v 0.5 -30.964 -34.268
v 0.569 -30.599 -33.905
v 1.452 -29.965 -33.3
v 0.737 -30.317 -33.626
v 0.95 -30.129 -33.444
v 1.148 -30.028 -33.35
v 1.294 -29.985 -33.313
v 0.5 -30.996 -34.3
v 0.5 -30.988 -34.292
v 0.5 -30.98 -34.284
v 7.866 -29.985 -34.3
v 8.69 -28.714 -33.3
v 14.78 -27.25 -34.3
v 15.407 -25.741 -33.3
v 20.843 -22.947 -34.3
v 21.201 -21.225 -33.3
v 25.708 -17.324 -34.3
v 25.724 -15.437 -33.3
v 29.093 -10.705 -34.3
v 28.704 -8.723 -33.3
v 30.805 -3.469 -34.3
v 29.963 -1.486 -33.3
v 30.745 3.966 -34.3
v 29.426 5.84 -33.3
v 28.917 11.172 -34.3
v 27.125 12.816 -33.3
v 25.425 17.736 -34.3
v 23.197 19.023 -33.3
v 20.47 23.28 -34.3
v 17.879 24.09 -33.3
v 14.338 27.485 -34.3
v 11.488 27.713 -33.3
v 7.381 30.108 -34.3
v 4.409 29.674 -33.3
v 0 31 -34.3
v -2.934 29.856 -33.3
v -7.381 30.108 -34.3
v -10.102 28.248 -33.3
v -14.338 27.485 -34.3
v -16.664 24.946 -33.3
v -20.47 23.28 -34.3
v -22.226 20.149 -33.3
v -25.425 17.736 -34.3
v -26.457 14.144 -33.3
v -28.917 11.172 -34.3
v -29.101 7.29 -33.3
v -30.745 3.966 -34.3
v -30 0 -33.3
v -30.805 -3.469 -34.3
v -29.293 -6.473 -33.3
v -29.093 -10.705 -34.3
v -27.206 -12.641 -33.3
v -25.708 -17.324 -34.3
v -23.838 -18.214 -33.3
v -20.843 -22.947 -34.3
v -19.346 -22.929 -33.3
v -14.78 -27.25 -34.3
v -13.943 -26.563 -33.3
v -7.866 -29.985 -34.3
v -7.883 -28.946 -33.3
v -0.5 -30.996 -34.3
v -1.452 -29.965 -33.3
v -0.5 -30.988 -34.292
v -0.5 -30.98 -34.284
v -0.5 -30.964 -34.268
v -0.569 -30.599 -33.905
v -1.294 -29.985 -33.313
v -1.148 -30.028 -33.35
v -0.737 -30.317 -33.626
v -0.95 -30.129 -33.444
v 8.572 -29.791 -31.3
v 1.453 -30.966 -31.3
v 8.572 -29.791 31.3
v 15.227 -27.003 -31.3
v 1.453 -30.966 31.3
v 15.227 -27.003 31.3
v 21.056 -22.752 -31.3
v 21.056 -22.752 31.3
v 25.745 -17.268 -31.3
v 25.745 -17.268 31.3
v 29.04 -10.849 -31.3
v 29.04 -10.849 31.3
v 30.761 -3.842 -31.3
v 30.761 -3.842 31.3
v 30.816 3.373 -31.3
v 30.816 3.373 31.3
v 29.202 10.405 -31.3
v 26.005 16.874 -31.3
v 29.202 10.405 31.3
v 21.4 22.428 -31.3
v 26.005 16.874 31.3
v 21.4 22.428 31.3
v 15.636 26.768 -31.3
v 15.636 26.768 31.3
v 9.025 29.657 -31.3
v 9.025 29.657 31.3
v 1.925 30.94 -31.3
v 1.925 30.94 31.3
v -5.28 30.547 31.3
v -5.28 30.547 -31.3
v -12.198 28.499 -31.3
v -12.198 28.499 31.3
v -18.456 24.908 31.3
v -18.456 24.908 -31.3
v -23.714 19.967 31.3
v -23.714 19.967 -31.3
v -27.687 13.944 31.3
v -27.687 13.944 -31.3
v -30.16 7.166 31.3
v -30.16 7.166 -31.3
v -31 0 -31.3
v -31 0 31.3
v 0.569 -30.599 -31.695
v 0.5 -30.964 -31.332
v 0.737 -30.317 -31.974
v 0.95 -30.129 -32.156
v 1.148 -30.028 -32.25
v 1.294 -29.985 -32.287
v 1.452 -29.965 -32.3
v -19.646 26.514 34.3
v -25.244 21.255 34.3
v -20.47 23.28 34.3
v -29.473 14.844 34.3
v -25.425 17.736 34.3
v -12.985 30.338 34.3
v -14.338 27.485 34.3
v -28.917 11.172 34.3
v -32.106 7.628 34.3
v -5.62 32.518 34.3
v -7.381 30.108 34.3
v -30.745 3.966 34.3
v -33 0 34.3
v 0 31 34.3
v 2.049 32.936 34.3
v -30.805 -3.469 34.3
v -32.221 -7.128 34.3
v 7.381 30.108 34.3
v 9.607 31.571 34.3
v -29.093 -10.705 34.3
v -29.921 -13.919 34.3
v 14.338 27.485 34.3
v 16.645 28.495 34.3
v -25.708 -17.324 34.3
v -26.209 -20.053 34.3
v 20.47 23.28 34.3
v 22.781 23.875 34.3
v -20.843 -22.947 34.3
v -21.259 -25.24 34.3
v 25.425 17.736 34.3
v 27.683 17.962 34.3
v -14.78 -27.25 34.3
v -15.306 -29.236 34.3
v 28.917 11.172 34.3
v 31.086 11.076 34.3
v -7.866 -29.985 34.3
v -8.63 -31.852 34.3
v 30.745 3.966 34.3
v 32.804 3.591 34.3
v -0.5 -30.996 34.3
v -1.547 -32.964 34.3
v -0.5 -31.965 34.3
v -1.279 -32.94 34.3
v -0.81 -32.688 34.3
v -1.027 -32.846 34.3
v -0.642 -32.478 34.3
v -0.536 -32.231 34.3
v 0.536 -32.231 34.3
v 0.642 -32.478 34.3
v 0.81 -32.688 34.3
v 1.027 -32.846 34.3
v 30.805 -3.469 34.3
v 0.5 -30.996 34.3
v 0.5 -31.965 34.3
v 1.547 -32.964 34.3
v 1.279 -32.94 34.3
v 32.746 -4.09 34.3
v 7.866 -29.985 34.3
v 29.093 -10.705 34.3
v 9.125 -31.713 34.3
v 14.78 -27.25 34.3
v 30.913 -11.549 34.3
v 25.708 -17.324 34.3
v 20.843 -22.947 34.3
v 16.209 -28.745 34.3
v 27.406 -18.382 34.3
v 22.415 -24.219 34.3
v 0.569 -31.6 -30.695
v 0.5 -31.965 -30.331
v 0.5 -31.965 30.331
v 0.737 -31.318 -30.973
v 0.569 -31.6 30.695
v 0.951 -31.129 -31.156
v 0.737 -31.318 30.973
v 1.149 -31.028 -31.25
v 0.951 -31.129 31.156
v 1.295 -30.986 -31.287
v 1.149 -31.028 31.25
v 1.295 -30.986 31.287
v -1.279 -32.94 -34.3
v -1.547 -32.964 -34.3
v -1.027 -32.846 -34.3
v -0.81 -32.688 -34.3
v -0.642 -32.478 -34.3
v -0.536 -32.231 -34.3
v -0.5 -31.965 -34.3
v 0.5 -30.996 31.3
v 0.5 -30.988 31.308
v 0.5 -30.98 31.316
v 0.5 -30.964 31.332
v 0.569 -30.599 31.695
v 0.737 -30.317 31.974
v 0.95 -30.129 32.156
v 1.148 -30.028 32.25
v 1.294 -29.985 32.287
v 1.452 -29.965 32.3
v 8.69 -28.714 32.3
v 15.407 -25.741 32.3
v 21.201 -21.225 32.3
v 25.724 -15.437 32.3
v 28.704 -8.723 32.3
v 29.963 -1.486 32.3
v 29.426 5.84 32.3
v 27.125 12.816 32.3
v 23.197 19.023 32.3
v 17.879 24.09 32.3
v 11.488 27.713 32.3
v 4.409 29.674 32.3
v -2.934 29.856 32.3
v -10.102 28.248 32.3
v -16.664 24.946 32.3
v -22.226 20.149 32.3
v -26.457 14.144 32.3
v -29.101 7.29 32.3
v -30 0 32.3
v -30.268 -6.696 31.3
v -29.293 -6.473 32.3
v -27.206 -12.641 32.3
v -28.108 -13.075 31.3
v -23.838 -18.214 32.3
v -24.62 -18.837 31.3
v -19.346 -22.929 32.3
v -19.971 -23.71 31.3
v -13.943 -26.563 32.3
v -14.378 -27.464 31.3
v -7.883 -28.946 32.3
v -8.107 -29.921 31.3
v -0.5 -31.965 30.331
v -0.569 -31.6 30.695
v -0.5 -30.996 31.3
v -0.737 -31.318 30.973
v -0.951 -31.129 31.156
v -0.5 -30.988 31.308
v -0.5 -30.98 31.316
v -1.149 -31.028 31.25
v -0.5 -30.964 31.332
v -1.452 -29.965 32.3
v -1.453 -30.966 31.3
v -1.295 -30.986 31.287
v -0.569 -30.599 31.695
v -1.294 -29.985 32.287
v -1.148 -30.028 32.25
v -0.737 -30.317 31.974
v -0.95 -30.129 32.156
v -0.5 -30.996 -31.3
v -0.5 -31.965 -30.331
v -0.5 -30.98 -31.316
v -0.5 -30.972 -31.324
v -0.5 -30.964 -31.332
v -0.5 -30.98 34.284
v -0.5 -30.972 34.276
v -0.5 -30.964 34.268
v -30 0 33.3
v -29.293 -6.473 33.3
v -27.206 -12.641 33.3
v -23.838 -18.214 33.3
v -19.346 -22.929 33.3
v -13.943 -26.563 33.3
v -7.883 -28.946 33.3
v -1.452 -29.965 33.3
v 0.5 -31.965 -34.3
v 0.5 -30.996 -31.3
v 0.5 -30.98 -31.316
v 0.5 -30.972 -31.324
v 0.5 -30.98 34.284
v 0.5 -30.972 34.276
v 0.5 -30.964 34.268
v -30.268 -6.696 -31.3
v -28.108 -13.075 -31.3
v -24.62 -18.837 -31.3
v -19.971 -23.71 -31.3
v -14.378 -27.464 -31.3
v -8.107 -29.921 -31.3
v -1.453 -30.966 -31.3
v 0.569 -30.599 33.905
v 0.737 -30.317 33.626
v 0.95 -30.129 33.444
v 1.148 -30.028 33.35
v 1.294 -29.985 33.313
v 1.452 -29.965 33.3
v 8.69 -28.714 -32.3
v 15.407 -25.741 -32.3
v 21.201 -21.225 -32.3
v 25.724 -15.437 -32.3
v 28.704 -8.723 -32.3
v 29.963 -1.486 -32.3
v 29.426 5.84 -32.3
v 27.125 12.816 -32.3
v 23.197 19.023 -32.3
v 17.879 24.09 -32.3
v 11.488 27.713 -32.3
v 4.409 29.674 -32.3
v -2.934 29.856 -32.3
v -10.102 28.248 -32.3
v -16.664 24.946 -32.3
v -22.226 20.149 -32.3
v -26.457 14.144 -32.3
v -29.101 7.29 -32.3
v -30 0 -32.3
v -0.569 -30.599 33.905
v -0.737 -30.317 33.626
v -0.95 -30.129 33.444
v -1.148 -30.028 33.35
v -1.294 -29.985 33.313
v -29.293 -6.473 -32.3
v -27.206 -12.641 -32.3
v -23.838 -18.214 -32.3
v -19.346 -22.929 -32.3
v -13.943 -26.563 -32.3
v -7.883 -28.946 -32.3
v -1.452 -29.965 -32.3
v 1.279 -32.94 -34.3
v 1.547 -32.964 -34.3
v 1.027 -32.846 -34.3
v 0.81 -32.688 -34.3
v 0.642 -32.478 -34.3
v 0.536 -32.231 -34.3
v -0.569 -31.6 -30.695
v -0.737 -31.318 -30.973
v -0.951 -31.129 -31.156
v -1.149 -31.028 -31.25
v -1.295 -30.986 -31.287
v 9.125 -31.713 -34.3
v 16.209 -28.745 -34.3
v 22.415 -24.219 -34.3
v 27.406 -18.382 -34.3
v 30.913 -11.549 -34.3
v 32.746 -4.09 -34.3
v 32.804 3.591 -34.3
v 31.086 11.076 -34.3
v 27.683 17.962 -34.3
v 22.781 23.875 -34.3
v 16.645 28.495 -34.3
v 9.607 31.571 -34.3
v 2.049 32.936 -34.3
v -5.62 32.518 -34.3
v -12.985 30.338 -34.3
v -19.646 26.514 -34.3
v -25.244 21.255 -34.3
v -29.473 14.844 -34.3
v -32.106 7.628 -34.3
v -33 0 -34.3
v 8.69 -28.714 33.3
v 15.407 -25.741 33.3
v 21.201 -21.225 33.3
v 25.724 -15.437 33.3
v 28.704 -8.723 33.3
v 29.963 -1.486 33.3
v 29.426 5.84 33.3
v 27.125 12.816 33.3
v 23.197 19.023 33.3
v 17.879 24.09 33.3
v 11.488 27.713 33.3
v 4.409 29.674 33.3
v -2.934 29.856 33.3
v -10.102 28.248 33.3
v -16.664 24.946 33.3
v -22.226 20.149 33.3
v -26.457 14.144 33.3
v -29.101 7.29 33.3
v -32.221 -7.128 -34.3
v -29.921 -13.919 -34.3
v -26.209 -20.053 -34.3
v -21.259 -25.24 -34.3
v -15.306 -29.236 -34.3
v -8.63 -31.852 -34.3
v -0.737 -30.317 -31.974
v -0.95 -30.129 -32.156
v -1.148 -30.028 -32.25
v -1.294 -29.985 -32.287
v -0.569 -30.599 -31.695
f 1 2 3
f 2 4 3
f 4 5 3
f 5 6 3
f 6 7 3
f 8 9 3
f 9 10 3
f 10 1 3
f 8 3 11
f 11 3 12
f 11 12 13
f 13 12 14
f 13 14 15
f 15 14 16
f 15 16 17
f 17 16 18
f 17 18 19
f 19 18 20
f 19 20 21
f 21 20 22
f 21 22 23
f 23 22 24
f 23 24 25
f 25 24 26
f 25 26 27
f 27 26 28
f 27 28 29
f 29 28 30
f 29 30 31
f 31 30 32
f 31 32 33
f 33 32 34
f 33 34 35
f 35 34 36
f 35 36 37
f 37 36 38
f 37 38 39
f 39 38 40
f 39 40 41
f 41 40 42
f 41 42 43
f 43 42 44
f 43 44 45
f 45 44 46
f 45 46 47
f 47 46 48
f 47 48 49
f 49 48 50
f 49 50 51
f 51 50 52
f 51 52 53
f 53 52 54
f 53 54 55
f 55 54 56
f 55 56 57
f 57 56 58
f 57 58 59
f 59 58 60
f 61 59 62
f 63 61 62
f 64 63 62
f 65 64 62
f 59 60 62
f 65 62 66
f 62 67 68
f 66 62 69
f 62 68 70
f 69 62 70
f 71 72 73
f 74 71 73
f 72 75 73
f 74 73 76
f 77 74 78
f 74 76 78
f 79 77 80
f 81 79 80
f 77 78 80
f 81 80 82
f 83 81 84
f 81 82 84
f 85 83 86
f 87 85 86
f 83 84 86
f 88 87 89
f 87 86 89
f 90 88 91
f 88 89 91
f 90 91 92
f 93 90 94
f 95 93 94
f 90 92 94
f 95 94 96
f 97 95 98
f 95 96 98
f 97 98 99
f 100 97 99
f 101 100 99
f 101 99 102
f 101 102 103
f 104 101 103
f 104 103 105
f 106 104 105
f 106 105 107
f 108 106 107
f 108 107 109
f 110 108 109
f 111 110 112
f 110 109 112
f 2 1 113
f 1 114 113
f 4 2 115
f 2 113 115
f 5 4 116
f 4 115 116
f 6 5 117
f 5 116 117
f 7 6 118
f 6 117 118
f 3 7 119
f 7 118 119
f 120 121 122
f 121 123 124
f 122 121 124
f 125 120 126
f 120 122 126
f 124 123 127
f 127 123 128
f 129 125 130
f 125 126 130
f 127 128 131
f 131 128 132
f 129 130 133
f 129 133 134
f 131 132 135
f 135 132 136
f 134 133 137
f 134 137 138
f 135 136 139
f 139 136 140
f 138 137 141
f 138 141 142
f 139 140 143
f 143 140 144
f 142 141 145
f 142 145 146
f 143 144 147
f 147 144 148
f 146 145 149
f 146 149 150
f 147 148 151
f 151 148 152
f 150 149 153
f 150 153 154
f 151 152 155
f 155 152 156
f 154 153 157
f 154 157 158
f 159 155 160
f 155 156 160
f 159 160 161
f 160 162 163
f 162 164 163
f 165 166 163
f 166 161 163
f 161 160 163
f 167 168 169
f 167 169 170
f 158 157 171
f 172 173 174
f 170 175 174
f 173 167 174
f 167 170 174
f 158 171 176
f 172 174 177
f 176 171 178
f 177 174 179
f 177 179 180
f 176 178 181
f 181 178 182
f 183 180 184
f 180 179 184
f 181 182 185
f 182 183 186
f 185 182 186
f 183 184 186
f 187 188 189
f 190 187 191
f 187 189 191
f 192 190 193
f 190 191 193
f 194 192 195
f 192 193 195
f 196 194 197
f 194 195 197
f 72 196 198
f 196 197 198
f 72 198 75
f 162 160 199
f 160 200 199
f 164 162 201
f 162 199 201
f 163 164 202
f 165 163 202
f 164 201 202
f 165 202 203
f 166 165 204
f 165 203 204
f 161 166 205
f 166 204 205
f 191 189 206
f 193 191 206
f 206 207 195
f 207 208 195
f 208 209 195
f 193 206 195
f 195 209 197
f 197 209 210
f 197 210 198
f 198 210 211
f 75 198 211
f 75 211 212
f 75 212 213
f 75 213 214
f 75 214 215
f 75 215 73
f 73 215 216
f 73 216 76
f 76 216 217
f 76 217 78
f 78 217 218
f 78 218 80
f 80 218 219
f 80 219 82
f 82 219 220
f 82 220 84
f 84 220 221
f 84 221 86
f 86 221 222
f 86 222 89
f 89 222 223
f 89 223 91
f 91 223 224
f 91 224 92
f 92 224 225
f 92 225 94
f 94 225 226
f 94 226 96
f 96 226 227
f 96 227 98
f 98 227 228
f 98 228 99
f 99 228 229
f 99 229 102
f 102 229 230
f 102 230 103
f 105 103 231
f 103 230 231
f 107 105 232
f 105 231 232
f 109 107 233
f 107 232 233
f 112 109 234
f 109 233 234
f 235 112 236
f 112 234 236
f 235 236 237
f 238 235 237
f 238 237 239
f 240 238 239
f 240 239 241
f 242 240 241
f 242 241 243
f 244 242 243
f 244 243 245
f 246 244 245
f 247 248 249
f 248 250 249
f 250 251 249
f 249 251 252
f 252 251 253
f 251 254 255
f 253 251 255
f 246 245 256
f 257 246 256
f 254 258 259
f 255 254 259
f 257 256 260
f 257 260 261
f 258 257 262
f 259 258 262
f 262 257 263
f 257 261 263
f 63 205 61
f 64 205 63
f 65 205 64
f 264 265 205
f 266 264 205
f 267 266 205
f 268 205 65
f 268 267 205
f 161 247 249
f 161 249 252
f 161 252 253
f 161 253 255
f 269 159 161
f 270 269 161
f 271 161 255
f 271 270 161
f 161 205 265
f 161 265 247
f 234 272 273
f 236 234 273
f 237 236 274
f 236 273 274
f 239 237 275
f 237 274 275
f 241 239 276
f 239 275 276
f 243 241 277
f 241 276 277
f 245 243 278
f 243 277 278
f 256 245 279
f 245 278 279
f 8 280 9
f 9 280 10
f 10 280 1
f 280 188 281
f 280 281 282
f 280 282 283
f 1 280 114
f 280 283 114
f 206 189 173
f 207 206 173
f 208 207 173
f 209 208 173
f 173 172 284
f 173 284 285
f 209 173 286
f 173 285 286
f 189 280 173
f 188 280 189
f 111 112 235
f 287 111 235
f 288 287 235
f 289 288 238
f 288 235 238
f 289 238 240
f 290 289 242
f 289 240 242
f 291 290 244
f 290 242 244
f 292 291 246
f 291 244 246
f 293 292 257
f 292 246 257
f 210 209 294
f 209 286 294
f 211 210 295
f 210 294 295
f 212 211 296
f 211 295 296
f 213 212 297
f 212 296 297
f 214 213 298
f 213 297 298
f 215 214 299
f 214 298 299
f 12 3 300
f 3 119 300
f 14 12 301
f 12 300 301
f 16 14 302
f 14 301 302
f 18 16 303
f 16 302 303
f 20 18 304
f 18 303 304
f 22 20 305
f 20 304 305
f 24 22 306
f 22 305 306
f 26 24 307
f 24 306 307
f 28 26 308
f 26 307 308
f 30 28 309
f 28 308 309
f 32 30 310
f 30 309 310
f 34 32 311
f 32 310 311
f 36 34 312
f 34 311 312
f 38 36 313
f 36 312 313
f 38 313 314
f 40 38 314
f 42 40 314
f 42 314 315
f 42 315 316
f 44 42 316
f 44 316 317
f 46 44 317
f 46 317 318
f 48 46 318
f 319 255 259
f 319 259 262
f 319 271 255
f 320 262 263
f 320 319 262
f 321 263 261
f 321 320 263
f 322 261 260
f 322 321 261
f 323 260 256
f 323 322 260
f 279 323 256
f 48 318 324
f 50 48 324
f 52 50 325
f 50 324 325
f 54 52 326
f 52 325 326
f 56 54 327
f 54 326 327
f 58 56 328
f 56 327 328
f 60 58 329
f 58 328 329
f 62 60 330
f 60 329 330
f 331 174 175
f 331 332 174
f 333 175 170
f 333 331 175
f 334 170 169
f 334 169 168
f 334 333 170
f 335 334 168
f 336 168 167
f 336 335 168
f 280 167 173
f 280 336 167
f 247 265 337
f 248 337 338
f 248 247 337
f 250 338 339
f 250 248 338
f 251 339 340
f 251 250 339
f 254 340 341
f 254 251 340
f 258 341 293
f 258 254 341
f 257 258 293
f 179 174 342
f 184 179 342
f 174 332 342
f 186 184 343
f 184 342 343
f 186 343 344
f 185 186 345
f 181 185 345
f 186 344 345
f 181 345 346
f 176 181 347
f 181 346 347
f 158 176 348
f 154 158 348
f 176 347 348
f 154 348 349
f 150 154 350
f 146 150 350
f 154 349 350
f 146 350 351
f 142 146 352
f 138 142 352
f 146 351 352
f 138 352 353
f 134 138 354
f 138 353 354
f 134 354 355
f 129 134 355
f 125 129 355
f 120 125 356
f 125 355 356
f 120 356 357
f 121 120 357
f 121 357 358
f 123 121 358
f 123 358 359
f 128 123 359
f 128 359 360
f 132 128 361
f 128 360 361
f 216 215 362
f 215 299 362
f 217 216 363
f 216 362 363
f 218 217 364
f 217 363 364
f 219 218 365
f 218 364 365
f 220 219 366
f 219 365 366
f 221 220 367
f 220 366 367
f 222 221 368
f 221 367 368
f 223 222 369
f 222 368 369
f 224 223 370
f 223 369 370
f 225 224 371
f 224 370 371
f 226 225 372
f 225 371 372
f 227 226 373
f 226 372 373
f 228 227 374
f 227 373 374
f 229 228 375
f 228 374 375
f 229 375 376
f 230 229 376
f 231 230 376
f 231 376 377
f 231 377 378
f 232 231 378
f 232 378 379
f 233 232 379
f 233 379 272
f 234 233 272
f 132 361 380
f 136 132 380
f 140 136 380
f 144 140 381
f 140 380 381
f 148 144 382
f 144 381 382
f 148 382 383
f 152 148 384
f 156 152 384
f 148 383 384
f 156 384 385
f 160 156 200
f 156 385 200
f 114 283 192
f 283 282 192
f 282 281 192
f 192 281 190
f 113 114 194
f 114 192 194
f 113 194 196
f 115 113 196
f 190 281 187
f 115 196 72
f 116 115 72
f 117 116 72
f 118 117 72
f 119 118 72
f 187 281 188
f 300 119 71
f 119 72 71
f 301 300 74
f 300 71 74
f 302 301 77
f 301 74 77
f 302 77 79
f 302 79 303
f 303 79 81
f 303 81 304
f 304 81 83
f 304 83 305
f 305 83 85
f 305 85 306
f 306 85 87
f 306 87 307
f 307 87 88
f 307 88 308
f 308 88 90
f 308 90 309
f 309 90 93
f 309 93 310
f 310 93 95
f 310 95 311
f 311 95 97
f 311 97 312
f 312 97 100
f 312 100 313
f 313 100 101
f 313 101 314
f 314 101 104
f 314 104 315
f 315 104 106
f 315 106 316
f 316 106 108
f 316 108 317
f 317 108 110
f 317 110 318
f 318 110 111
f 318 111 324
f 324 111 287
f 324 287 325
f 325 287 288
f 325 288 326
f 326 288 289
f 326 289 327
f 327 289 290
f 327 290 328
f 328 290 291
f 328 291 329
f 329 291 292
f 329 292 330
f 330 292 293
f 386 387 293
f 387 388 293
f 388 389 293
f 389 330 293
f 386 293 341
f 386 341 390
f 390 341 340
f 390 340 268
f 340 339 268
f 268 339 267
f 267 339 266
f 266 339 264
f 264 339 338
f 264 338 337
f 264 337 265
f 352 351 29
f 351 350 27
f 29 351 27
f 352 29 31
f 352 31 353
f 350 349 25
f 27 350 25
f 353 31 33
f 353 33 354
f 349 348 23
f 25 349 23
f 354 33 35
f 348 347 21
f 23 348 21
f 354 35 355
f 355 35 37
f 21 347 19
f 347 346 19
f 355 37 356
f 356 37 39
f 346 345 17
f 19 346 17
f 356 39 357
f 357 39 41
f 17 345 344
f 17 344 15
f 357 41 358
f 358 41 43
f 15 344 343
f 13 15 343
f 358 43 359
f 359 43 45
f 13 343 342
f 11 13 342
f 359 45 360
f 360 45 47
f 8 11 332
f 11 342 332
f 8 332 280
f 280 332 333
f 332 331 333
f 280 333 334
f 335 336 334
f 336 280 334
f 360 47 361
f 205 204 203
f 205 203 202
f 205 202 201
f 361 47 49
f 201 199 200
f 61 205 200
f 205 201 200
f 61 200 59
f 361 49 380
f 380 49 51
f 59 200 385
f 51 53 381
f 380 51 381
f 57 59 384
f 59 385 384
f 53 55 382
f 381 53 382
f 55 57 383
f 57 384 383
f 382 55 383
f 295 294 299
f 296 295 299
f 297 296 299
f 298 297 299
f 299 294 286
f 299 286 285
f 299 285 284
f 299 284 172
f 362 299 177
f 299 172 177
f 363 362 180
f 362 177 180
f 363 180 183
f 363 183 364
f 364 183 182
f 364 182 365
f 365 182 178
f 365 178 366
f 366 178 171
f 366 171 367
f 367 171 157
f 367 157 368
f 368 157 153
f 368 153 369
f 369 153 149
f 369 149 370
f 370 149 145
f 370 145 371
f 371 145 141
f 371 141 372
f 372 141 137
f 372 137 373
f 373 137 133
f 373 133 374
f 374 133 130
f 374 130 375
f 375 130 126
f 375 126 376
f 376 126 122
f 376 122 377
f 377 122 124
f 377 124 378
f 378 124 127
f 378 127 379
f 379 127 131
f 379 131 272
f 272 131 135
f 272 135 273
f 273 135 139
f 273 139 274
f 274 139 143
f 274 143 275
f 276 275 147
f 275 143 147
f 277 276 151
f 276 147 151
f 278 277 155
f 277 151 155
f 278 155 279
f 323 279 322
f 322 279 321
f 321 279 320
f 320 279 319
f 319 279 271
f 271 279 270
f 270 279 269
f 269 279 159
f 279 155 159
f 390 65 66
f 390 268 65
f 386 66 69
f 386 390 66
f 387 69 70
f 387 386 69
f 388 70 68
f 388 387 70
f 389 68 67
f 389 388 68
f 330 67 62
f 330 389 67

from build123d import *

# Parameters (mm, degrees)
F2_W     = 1
F2_H     = 40
F3_DEPTH = 68.601
F4_R     = 0.99999


# Not quite as in the source:
# - a fillet or chamfer is up to 0.001 mm smaller than in the source, because OpenCascade refuses the exact size


with BuildPart() as f1:
    # F0 (on Front) → F1 (revolve)
    with BuildSketch(Plane.XZ):
        Polygon((-33, 34.3), (-33, 0), (-31, 0), (-31, 31.3), (-30, 32.3), (-30, 33.3), (-31, 34.3), align=None)
        Polygon((-31, 0), (-33, 0), (-33, -34.3), (-31, -34.3), (-30, -33.3), (-30, -32.3), (-31, -31.3), align=None)
    revolve(axis=Axis((0, 0, 17.15), (0, 0, 1)))

    # F2 (on face) → F3 (cut, through all)
    with BuildSketch(Plane.XY.offset(34.3)):
        with Locations((0, -20)):
            Rectangle(F2_W, F2_H)
    extrude(amount=-F3_DEPTH, mode=Mode.SUBTRACT)

    # F4 (radius 1 in the source; OpenCascade refuses exactly that, so slightly less here)
    f4_edges = [f1.edges().sort_by_distance(p)[0] for p in [
        (-0.5, -32.996212, 0),
        (-0.5, -30.995967, 0),
        (-0.5, -29.995833, 32.8),
        (-0.5, -29.995833, -32.8),
        (0.5, -29.995833, -32.8),
        (0.5, -30.995967, 0),
        (0.5, -29.995833, 32.8),
        (0.5, -32.996212, 0),
    ]]
    fillet(f4_edges, radius=F4_R)


solid = f1.part
